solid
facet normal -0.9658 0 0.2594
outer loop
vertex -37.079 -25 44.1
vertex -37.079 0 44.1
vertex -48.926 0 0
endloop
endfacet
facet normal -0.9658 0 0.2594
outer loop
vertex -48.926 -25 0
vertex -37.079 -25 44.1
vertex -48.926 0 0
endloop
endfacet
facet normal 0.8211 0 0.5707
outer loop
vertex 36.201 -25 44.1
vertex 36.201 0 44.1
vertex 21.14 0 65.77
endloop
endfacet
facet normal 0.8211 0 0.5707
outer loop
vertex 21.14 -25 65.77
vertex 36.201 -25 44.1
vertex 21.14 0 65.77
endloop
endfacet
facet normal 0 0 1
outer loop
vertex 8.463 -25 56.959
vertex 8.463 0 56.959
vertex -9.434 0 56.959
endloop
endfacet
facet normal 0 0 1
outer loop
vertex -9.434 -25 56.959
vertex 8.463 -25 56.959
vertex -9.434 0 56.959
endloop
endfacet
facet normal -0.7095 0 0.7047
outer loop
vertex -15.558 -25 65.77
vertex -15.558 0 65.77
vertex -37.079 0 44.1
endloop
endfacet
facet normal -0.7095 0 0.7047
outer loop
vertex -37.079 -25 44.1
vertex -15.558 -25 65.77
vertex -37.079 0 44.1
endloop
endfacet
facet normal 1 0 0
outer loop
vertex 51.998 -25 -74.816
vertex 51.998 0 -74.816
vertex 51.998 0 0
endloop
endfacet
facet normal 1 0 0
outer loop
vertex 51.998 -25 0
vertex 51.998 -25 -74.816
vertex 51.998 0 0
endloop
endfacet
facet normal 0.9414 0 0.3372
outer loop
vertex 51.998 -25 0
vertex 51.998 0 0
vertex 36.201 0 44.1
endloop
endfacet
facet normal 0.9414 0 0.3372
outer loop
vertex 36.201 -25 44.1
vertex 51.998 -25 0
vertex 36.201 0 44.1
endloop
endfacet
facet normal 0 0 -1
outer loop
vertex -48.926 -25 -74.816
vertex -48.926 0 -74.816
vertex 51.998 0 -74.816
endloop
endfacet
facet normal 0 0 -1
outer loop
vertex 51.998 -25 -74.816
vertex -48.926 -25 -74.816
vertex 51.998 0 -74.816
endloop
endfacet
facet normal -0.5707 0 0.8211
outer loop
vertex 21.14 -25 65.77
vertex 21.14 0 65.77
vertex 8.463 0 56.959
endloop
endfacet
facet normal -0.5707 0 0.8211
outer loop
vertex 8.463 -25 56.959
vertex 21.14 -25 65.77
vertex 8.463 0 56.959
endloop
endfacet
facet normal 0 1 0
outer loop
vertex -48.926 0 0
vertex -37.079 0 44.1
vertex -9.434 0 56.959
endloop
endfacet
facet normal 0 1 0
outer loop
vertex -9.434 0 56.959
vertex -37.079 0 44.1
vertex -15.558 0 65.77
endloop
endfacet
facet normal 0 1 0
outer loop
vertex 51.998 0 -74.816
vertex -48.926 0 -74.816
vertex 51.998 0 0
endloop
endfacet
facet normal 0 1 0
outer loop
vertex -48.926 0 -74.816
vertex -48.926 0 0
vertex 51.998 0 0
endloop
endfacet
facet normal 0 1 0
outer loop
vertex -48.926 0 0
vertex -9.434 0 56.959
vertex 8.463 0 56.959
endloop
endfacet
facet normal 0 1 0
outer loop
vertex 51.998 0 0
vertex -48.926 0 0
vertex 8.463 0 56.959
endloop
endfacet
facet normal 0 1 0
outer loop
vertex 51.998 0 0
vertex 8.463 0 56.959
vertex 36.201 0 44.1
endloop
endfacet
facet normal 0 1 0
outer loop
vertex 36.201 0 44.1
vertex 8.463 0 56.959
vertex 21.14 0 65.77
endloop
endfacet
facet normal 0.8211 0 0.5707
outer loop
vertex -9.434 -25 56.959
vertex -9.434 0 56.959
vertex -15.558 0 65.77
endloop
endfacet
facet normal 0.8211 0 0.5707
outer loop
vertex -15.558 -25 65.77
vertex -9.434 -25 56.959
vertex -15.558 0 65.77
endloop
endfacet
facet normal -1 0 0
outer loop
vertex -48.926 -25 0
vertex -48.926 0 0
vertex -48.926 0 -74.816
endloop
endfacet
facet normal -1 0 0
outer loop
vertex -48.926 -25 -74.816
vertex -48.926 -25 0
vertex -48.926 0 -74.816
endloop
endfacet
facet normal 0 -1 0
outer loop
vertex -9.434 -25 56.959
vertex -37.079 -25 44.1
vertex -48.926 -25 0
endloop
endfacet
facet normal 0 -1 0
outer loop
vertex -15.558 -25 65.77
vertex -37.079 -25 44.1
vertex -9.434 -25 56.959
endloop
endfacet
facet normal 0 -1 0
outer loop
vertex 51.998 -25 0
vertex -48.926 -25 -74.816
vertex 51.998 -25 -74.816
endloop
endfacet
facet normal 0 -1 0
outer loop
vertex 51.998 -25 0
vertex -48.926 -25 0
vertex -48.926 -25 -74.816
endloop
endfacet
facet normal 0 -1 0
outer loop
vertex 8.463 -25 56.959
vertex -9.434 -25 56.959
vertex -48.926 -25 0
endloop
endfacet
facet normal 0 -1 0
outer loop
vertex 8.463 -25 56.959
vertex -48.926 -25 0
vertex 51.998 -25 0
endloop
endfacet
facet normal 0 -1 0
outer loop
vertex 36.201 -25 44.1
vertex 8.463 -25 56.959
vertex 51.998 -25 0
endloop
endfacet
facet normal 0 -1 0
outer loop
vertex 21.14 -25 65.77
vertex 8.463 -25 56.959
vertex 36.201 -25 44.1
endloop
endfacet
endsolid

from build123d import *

# Parameters (mm, degrees)
F1_DEPTH = 25


with BuildPart() as f1:
    # F0 (on Front) → F1 (new body)
    with BuildSketch(Plane.XZ):
        Polygon((0, 0), (-48.926342, -74.815616), (51.997956, -74.815616), align=None)
        Polygon((-48.926342, 0), (-48.926342, -74.815616), (0, 0), align=None)
        Polygon((-37.078708, 44.099528), (0, 0), (-15.557691, 65.769808), align=None)
        Polygon((-15.557691, 65.769808), (0, 0), (21.13994, 65.769808), (8.463154, 56.959255), (-9.434227, 56.959255), align=None)
        Polygon((21.13994, 65.769808), (0, 0), (36.201105, 44.099528), align=None)
        Polygon((36.201105, 44.099528), (0, 0), (51.997956, 0), align=None)
        Polygon((0, 0), (51.997956, -74.815616), (51.997956, 0), align=None)
        Polygon((-48.926342, 0), (0, 0), (-37.078708, 44.099528), align=None)
    extrude(amount=F1_DEPTH)


solid = f1.part
